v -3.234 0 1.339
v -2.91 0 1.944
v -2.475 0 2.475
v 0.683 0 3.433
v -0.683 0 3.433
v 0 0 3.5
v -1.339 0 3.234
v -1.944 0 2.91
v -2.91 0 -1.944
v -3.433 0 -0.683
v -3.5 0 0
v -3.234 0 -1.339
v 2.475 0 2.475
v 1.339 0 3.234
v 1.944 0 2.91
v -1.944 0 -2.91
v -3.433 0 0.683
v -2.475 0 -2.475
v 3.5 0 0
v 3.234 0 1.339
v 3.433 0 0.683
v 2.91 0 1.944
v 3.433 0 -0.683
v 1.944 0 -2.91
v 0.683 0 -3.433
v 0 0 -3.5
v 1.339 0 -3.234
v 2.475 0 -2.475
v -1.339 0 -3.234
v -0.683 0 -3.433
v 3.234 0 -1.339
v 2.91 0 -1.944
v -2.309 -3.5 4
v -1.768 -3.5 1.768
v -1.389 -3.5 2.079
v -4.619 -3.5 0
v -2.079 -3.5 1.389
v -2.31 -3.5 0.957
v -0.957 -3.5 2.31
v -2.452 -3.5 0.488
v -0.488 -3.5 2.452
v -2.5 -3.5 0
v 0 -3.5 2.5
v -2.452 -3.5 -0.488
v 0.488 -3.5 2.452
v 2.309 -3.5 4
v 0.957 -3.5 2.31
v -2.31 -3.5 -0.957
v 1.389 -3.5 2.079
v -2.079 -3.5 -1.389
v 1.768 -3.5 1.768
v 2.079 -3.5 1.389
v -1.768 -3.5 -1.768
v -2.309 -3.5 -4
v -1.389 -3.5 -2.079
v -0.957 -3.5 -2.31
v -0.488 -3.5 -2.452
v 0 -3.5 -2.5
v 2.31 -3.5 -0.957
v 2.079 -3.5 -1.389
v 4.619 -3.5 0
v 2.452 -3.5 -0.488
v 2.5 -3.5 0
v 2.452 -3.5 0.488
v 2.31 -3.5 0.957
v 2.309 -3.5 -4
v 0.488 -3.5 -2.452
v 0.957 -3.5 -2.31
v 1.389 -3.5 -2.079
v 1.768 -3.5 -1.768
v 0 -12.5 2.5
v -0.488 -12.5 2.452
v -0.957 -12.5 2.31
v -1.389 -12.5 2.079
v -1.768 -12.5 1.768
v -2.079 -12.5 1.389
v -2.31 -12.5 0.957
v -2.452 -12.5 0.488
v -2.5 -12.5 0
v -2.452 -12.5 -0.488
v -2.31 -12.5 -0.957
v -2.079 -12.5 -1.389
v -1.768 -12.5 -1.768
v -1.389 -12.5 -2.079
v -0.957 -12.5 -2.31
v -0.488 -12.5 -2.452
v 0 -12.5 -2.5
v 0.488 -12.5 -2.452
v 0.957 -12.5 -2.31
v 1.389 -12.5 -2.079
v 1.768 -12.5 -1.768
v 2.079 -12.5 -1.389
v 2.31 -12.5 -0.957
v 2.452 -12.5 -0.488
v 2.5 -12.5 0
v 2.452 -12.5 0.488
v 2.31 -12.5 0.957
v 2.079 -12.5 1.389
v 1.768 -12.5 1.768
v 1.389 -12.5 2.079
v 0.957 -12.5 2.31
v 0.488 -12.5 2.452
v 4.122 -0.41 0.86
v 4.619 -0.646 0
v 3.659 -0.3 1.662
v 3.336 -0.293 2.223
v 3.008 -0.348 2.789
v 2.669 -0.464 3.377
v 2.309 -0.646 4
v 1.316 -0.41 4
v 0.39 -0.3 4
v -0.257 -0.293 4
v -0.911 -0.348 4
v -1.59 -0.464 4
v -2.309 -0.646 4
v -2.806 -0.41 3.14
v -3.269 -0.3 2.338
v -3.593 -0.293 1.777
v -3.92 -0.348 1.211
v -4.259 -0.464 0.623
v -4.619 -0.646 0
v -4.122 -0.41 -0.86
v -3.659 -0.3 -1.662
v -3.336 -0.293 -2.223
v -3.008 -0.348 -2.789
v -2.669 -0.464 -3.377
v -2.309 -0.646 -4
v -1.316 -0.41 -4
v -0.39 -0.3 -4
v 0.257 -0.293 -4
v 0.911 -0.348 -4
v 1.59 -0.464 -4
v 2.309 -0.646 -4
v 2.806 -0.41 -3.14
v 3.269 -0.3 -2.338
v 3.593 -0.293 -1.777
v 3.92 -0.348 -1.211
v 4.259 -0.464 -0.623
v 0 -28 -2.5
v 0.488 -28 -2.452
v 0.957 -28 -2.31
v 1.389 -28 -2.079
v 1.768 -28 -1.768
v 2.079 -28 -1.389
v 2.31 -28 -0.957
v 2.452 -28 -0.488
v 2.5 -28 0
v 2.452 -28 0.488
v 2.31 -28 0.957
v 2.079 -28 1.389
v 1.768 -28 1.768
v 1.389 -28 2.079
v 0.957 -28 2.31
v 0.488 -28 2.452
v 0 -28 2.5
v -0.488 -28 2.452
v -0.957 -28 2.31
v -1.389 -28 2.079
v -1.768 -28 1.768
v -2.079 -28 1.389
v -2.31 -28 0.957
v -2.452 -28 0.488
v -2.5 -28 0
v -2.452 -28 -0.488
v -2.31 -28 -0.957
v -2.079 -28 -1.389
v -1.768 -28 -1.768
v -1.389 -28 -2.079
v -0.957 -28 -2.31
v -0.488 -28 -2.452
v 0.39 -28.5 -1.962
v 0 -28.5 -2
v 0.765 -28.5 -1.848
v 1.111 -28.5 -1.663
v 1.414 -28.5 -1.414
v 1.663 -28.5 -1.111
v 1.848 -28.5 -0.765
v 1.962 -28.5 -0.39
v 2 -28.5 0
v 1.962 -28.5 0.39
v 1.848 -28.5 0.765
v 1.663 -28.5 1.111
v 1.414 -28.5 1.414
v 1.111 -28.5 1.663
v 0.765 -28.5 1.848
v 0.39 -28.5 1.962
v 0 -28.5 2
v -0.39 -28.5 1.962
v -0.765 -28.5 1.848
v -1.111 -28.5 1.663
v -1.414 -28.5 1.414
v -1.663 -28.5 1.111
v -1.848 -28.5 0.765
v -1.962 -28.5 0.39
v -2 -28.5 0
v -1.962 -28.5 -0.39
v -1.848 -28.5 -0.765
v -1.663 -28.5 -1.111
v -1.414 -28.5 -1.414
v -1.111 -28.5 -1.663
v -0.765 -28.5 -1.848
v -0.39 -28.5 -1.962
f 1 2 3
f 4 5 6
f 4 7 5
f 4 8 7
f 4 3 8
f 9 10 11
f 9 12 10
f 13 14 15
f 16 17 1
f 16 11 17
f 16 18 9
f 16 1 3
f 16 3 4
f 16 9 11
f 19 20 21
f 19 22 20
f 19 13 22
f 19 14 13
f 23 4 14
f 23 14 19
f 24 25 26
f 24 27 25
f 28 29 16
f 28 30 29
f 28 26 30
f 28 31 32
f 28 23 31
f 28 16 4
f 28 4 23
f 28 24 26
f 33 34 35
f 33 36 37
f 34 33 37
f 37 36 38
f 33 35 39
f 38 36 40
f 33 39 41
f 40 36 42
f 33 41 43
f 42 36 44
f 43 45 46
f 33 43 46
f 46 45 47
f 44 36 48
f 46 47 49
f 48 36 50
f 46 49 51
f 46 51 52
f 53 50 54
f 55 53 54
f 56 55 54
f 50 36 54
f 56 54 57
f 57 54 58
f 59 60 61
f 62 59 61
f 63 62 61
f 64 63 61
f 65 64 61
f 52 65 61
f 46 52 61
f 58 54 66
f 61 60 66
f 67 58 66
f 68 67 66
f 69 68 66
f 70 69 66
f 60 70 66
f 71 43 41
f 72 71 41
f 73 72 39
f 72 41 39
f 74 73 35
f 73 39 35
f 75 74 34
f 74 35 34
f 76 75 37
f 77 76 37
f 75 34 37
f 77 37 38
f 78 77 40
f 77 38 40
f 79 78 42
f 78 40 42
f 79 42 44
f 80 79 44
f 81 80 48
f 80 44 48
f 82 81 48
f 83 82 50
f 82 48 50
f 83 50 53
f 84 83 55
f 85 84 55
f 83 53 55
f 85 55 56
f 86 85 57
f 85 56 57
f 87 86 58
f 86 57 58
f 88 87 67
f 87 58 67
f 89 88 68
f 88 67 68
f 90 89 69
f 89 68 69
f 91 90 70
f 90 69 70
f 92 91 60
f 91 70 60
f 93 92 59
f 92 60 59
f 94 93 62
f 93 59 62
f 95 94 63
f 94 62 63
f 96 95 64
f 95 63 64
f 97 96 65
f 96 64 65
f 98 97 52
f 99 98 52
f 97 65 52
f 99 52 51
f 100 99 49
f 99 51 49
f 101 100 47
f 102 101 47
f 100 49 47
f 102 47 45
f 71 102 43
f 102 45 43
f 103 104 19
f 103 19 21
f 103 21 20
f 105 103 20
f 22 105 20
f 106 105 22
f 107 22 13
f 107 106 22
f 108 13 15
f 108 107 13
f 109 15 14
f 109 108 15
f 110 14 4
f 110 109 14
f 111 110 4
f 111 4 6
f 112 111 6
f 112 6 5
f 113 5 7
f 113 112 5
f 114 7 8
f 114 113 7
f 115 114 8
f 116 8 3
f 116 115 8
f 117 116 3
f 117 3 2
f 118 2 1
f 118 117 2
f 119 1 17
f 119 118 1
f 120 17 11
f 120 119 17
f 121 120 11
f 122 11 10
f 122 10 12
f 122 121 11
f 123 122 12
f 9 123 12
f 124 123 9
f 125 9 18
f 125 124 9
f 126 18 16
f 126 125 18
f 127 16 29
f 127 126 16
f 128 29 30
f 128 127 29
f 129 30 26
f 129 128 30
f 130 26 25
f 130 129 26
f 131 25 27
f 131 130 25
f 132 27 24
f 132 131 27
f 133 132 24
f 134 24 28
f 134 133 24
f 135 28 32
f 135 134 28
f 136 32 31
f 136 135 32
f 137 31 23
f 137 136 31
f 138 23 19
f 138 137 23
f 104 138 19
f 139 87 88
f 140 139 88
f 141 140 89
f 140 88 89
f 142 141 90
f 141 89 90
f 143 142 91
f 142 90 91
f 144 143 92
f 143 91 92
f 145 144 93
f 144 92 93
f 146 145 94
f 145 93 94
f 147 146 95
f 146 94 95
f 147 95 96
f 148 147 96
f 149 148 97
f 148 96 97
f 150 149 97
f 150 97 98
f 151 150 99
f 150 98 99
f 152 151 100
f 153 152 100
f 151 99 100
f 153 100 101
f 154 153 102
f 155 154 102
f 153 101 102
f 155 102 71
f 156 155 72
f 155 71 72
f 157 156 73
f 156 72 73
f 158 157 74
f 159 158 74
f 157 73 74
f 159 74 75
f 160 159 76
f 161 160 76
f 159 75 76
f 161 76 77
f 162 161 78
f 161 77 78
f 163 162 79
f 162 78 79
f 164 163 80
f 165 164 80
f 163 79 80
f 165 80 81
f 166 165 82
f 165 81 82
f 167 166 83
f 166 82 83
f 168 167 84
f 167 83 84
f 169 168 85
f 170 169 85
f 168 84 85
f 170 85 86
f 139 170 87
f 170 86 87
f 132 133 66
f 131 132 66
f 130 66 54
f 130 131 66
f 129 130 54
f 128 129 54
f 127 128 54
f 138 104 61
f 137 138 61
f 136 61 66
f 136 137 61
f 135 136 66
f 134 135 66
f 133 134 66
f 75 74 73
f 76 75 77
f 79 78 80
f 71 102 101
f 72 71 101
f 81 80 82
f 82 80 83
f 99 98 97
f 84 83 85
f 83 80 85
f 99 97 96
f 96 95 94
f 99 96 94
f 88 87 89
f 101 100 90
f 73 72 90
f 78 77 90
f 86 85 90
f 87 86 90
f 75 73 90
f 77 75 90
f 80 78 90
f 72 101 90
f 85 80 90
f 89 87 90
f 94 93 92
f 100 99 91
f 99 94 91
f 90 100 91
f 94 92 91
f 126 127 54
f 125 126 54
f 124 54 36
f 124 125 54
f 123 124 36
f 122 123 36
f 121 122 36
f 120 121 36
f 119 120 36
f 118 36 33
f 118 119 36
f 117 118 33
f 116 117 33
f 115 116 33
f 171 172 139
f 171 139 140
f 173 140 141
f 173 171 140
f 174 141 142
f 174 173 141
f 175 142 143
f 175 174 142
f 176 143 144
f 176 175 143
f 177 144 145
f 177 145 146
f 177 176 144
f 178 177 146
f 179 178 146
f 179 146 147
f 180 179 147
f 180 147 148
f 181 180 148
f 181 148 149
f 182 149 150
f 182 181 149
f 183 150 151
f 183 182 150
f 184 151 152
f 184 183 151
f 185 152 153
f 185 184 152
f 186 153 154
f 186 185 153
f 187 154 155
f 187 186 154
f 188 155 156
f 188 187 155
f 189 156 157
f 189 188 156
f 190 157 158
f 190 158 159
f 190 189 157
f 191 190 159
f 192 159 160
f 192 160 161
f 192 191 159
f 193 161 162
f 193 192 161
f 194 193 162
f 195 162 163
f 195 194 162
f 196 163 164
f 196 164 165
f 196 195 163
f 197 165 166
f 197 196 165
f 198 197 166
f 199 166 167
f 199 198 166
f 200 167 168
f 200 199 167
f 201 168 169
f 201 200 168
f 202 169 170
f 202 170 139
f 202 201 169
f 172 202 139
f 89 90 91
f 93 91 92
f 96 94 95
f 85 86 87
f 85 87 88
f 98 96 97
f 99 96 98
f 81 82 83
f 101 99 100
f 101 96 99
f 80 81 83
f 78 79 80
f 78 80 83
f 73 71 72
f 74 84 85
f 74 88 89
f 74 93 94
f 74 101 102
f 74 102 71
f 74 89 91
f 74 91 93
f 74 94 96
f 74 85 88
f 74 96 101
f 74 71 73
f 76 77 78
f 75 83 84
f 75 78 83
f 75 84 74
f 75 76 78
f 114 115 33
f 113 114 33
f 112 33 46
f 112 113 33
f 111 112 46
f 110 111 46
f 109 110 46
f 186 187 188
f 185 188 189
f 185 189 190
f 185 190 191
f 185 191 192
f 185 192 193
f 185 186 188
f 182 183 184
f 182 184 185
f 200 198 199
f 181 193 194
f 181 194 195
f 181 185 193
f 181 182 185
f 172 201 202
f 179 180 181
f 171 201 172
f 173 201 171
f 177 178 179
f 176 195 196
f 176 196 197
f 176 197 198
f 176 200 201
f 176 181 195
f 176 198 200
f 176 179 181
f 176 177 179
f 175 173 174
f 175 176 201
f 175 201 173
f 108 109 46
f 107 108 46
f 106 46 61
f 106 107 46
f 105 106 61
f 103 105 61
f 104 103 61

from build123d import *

# Parameters (mm, degrees)
BOSS_EXTRUDE1_DEPTH          = 3.5
SKETCH2_OUTSIDE_W            = 41.638
SKETCH2_OUTSIDE_H            = 40.4
SKETCH2_OUTSIDE_R            = 3.5
CUT_EXTRUDE1_DEPTH           = 8.041543391
CUT_EXTRUDE1_TAPER           = 60
CUT_EXTRUDE1_OTHER_WAY_DEPTH = 8.041543391
SKETCH3_R                    = 2.5
BOSS_EXTRUDE2_DEPTH          = 9
SKETCH4_R                    = 2.5
BOSS_EXTRUDE3_DEPTH          = 16
CHAMFER1_SIZE                = 0.5


with BuildPart() as part:
    # Sketch1 → Boss-Extrude1 (new body)
    with BuildSketch(Plane(origin=(0, 0, 0), x_dir=(1, 0, 0), z_dir=(0, 1, 0))):
        Polygon((-4.618802154, 0), (-2.309401077, -4), (2.309401077, -4), (4.618802154, 0), (2.309401077, 4), (-2.309401077, 4), align=None)
    extrude(amount=-BOSS_EXTRUDE1_DEPTH)

    # Sketch2 outside → Cut-Extrude1 (cut)
    with BuildSketch(Plane(origin=(0, 0, 0), x_dir=(1, 0, 0), z_dir=(0, 1, 0))):
        Rectangle(SKETCH2_OUTSIDE_W, SKETCH2_OUTSIDE_H)
        Circle(SKETCH2_OUTSIDE_R, mode=Mode.SUBTRACT)
    extrude(amount=-CUT_EXTRUDE1_DEPTH, taper=CUT_EXTRUDE1_TAPER, mode=Mode.SUBTRACT)

    # Sketch2 outside → Cut-Extrude1 other way (cut)
    with BuildSketch(Plane(origin=(0, 0, 0), x_dir=(1, 0, 0), z_dir=(0, 1, 0))):
        Rectangle(SKETCH2_OUTSIDE_W, SKETCH2_OUTSIDE_H)
        Circle(SKETCH2_OUTSIDE_R, mode=Mode.SUBTRACT)
    extrude(amount=CUT_EXTRUDE1_OTHER_WAY_DEPTH, mode=Mode.SUBTRACT)

    # Sketch3 → Boss-Extrude2 (add)
    with BuildSketch(Plane.XZ.offset(3.5)):
        with Locations(Location((0, 0, 0), (0, 0, 90))):
            Circle(SKETCH3_R)
    extrude(amount=BOSS_EXTRUDE2_DEPTH)


with BuildPart() as body_2:
    # Sketch4 → Boss-Extrude3 (new body)
    with BuildSketch(Plane.XZ.offset(12.5)):
        with Locations(Location((0, 0, 0), (0, 0, 270))):
            Circle(SKETCH4_R)
    extrude(amount=BOSS_EXTRUDE3_DEPTH)

    # Chamfer1
    chamfer1_edges = [body_2.edges().sort_by_distance(p)[0] for p in [
        (0, -28.5, 2.5),
    ]]
    chamfer(chamfer1_edges, length=CHAMFER1_SIZE)


solid = Compound([part.part, body_2.part])
